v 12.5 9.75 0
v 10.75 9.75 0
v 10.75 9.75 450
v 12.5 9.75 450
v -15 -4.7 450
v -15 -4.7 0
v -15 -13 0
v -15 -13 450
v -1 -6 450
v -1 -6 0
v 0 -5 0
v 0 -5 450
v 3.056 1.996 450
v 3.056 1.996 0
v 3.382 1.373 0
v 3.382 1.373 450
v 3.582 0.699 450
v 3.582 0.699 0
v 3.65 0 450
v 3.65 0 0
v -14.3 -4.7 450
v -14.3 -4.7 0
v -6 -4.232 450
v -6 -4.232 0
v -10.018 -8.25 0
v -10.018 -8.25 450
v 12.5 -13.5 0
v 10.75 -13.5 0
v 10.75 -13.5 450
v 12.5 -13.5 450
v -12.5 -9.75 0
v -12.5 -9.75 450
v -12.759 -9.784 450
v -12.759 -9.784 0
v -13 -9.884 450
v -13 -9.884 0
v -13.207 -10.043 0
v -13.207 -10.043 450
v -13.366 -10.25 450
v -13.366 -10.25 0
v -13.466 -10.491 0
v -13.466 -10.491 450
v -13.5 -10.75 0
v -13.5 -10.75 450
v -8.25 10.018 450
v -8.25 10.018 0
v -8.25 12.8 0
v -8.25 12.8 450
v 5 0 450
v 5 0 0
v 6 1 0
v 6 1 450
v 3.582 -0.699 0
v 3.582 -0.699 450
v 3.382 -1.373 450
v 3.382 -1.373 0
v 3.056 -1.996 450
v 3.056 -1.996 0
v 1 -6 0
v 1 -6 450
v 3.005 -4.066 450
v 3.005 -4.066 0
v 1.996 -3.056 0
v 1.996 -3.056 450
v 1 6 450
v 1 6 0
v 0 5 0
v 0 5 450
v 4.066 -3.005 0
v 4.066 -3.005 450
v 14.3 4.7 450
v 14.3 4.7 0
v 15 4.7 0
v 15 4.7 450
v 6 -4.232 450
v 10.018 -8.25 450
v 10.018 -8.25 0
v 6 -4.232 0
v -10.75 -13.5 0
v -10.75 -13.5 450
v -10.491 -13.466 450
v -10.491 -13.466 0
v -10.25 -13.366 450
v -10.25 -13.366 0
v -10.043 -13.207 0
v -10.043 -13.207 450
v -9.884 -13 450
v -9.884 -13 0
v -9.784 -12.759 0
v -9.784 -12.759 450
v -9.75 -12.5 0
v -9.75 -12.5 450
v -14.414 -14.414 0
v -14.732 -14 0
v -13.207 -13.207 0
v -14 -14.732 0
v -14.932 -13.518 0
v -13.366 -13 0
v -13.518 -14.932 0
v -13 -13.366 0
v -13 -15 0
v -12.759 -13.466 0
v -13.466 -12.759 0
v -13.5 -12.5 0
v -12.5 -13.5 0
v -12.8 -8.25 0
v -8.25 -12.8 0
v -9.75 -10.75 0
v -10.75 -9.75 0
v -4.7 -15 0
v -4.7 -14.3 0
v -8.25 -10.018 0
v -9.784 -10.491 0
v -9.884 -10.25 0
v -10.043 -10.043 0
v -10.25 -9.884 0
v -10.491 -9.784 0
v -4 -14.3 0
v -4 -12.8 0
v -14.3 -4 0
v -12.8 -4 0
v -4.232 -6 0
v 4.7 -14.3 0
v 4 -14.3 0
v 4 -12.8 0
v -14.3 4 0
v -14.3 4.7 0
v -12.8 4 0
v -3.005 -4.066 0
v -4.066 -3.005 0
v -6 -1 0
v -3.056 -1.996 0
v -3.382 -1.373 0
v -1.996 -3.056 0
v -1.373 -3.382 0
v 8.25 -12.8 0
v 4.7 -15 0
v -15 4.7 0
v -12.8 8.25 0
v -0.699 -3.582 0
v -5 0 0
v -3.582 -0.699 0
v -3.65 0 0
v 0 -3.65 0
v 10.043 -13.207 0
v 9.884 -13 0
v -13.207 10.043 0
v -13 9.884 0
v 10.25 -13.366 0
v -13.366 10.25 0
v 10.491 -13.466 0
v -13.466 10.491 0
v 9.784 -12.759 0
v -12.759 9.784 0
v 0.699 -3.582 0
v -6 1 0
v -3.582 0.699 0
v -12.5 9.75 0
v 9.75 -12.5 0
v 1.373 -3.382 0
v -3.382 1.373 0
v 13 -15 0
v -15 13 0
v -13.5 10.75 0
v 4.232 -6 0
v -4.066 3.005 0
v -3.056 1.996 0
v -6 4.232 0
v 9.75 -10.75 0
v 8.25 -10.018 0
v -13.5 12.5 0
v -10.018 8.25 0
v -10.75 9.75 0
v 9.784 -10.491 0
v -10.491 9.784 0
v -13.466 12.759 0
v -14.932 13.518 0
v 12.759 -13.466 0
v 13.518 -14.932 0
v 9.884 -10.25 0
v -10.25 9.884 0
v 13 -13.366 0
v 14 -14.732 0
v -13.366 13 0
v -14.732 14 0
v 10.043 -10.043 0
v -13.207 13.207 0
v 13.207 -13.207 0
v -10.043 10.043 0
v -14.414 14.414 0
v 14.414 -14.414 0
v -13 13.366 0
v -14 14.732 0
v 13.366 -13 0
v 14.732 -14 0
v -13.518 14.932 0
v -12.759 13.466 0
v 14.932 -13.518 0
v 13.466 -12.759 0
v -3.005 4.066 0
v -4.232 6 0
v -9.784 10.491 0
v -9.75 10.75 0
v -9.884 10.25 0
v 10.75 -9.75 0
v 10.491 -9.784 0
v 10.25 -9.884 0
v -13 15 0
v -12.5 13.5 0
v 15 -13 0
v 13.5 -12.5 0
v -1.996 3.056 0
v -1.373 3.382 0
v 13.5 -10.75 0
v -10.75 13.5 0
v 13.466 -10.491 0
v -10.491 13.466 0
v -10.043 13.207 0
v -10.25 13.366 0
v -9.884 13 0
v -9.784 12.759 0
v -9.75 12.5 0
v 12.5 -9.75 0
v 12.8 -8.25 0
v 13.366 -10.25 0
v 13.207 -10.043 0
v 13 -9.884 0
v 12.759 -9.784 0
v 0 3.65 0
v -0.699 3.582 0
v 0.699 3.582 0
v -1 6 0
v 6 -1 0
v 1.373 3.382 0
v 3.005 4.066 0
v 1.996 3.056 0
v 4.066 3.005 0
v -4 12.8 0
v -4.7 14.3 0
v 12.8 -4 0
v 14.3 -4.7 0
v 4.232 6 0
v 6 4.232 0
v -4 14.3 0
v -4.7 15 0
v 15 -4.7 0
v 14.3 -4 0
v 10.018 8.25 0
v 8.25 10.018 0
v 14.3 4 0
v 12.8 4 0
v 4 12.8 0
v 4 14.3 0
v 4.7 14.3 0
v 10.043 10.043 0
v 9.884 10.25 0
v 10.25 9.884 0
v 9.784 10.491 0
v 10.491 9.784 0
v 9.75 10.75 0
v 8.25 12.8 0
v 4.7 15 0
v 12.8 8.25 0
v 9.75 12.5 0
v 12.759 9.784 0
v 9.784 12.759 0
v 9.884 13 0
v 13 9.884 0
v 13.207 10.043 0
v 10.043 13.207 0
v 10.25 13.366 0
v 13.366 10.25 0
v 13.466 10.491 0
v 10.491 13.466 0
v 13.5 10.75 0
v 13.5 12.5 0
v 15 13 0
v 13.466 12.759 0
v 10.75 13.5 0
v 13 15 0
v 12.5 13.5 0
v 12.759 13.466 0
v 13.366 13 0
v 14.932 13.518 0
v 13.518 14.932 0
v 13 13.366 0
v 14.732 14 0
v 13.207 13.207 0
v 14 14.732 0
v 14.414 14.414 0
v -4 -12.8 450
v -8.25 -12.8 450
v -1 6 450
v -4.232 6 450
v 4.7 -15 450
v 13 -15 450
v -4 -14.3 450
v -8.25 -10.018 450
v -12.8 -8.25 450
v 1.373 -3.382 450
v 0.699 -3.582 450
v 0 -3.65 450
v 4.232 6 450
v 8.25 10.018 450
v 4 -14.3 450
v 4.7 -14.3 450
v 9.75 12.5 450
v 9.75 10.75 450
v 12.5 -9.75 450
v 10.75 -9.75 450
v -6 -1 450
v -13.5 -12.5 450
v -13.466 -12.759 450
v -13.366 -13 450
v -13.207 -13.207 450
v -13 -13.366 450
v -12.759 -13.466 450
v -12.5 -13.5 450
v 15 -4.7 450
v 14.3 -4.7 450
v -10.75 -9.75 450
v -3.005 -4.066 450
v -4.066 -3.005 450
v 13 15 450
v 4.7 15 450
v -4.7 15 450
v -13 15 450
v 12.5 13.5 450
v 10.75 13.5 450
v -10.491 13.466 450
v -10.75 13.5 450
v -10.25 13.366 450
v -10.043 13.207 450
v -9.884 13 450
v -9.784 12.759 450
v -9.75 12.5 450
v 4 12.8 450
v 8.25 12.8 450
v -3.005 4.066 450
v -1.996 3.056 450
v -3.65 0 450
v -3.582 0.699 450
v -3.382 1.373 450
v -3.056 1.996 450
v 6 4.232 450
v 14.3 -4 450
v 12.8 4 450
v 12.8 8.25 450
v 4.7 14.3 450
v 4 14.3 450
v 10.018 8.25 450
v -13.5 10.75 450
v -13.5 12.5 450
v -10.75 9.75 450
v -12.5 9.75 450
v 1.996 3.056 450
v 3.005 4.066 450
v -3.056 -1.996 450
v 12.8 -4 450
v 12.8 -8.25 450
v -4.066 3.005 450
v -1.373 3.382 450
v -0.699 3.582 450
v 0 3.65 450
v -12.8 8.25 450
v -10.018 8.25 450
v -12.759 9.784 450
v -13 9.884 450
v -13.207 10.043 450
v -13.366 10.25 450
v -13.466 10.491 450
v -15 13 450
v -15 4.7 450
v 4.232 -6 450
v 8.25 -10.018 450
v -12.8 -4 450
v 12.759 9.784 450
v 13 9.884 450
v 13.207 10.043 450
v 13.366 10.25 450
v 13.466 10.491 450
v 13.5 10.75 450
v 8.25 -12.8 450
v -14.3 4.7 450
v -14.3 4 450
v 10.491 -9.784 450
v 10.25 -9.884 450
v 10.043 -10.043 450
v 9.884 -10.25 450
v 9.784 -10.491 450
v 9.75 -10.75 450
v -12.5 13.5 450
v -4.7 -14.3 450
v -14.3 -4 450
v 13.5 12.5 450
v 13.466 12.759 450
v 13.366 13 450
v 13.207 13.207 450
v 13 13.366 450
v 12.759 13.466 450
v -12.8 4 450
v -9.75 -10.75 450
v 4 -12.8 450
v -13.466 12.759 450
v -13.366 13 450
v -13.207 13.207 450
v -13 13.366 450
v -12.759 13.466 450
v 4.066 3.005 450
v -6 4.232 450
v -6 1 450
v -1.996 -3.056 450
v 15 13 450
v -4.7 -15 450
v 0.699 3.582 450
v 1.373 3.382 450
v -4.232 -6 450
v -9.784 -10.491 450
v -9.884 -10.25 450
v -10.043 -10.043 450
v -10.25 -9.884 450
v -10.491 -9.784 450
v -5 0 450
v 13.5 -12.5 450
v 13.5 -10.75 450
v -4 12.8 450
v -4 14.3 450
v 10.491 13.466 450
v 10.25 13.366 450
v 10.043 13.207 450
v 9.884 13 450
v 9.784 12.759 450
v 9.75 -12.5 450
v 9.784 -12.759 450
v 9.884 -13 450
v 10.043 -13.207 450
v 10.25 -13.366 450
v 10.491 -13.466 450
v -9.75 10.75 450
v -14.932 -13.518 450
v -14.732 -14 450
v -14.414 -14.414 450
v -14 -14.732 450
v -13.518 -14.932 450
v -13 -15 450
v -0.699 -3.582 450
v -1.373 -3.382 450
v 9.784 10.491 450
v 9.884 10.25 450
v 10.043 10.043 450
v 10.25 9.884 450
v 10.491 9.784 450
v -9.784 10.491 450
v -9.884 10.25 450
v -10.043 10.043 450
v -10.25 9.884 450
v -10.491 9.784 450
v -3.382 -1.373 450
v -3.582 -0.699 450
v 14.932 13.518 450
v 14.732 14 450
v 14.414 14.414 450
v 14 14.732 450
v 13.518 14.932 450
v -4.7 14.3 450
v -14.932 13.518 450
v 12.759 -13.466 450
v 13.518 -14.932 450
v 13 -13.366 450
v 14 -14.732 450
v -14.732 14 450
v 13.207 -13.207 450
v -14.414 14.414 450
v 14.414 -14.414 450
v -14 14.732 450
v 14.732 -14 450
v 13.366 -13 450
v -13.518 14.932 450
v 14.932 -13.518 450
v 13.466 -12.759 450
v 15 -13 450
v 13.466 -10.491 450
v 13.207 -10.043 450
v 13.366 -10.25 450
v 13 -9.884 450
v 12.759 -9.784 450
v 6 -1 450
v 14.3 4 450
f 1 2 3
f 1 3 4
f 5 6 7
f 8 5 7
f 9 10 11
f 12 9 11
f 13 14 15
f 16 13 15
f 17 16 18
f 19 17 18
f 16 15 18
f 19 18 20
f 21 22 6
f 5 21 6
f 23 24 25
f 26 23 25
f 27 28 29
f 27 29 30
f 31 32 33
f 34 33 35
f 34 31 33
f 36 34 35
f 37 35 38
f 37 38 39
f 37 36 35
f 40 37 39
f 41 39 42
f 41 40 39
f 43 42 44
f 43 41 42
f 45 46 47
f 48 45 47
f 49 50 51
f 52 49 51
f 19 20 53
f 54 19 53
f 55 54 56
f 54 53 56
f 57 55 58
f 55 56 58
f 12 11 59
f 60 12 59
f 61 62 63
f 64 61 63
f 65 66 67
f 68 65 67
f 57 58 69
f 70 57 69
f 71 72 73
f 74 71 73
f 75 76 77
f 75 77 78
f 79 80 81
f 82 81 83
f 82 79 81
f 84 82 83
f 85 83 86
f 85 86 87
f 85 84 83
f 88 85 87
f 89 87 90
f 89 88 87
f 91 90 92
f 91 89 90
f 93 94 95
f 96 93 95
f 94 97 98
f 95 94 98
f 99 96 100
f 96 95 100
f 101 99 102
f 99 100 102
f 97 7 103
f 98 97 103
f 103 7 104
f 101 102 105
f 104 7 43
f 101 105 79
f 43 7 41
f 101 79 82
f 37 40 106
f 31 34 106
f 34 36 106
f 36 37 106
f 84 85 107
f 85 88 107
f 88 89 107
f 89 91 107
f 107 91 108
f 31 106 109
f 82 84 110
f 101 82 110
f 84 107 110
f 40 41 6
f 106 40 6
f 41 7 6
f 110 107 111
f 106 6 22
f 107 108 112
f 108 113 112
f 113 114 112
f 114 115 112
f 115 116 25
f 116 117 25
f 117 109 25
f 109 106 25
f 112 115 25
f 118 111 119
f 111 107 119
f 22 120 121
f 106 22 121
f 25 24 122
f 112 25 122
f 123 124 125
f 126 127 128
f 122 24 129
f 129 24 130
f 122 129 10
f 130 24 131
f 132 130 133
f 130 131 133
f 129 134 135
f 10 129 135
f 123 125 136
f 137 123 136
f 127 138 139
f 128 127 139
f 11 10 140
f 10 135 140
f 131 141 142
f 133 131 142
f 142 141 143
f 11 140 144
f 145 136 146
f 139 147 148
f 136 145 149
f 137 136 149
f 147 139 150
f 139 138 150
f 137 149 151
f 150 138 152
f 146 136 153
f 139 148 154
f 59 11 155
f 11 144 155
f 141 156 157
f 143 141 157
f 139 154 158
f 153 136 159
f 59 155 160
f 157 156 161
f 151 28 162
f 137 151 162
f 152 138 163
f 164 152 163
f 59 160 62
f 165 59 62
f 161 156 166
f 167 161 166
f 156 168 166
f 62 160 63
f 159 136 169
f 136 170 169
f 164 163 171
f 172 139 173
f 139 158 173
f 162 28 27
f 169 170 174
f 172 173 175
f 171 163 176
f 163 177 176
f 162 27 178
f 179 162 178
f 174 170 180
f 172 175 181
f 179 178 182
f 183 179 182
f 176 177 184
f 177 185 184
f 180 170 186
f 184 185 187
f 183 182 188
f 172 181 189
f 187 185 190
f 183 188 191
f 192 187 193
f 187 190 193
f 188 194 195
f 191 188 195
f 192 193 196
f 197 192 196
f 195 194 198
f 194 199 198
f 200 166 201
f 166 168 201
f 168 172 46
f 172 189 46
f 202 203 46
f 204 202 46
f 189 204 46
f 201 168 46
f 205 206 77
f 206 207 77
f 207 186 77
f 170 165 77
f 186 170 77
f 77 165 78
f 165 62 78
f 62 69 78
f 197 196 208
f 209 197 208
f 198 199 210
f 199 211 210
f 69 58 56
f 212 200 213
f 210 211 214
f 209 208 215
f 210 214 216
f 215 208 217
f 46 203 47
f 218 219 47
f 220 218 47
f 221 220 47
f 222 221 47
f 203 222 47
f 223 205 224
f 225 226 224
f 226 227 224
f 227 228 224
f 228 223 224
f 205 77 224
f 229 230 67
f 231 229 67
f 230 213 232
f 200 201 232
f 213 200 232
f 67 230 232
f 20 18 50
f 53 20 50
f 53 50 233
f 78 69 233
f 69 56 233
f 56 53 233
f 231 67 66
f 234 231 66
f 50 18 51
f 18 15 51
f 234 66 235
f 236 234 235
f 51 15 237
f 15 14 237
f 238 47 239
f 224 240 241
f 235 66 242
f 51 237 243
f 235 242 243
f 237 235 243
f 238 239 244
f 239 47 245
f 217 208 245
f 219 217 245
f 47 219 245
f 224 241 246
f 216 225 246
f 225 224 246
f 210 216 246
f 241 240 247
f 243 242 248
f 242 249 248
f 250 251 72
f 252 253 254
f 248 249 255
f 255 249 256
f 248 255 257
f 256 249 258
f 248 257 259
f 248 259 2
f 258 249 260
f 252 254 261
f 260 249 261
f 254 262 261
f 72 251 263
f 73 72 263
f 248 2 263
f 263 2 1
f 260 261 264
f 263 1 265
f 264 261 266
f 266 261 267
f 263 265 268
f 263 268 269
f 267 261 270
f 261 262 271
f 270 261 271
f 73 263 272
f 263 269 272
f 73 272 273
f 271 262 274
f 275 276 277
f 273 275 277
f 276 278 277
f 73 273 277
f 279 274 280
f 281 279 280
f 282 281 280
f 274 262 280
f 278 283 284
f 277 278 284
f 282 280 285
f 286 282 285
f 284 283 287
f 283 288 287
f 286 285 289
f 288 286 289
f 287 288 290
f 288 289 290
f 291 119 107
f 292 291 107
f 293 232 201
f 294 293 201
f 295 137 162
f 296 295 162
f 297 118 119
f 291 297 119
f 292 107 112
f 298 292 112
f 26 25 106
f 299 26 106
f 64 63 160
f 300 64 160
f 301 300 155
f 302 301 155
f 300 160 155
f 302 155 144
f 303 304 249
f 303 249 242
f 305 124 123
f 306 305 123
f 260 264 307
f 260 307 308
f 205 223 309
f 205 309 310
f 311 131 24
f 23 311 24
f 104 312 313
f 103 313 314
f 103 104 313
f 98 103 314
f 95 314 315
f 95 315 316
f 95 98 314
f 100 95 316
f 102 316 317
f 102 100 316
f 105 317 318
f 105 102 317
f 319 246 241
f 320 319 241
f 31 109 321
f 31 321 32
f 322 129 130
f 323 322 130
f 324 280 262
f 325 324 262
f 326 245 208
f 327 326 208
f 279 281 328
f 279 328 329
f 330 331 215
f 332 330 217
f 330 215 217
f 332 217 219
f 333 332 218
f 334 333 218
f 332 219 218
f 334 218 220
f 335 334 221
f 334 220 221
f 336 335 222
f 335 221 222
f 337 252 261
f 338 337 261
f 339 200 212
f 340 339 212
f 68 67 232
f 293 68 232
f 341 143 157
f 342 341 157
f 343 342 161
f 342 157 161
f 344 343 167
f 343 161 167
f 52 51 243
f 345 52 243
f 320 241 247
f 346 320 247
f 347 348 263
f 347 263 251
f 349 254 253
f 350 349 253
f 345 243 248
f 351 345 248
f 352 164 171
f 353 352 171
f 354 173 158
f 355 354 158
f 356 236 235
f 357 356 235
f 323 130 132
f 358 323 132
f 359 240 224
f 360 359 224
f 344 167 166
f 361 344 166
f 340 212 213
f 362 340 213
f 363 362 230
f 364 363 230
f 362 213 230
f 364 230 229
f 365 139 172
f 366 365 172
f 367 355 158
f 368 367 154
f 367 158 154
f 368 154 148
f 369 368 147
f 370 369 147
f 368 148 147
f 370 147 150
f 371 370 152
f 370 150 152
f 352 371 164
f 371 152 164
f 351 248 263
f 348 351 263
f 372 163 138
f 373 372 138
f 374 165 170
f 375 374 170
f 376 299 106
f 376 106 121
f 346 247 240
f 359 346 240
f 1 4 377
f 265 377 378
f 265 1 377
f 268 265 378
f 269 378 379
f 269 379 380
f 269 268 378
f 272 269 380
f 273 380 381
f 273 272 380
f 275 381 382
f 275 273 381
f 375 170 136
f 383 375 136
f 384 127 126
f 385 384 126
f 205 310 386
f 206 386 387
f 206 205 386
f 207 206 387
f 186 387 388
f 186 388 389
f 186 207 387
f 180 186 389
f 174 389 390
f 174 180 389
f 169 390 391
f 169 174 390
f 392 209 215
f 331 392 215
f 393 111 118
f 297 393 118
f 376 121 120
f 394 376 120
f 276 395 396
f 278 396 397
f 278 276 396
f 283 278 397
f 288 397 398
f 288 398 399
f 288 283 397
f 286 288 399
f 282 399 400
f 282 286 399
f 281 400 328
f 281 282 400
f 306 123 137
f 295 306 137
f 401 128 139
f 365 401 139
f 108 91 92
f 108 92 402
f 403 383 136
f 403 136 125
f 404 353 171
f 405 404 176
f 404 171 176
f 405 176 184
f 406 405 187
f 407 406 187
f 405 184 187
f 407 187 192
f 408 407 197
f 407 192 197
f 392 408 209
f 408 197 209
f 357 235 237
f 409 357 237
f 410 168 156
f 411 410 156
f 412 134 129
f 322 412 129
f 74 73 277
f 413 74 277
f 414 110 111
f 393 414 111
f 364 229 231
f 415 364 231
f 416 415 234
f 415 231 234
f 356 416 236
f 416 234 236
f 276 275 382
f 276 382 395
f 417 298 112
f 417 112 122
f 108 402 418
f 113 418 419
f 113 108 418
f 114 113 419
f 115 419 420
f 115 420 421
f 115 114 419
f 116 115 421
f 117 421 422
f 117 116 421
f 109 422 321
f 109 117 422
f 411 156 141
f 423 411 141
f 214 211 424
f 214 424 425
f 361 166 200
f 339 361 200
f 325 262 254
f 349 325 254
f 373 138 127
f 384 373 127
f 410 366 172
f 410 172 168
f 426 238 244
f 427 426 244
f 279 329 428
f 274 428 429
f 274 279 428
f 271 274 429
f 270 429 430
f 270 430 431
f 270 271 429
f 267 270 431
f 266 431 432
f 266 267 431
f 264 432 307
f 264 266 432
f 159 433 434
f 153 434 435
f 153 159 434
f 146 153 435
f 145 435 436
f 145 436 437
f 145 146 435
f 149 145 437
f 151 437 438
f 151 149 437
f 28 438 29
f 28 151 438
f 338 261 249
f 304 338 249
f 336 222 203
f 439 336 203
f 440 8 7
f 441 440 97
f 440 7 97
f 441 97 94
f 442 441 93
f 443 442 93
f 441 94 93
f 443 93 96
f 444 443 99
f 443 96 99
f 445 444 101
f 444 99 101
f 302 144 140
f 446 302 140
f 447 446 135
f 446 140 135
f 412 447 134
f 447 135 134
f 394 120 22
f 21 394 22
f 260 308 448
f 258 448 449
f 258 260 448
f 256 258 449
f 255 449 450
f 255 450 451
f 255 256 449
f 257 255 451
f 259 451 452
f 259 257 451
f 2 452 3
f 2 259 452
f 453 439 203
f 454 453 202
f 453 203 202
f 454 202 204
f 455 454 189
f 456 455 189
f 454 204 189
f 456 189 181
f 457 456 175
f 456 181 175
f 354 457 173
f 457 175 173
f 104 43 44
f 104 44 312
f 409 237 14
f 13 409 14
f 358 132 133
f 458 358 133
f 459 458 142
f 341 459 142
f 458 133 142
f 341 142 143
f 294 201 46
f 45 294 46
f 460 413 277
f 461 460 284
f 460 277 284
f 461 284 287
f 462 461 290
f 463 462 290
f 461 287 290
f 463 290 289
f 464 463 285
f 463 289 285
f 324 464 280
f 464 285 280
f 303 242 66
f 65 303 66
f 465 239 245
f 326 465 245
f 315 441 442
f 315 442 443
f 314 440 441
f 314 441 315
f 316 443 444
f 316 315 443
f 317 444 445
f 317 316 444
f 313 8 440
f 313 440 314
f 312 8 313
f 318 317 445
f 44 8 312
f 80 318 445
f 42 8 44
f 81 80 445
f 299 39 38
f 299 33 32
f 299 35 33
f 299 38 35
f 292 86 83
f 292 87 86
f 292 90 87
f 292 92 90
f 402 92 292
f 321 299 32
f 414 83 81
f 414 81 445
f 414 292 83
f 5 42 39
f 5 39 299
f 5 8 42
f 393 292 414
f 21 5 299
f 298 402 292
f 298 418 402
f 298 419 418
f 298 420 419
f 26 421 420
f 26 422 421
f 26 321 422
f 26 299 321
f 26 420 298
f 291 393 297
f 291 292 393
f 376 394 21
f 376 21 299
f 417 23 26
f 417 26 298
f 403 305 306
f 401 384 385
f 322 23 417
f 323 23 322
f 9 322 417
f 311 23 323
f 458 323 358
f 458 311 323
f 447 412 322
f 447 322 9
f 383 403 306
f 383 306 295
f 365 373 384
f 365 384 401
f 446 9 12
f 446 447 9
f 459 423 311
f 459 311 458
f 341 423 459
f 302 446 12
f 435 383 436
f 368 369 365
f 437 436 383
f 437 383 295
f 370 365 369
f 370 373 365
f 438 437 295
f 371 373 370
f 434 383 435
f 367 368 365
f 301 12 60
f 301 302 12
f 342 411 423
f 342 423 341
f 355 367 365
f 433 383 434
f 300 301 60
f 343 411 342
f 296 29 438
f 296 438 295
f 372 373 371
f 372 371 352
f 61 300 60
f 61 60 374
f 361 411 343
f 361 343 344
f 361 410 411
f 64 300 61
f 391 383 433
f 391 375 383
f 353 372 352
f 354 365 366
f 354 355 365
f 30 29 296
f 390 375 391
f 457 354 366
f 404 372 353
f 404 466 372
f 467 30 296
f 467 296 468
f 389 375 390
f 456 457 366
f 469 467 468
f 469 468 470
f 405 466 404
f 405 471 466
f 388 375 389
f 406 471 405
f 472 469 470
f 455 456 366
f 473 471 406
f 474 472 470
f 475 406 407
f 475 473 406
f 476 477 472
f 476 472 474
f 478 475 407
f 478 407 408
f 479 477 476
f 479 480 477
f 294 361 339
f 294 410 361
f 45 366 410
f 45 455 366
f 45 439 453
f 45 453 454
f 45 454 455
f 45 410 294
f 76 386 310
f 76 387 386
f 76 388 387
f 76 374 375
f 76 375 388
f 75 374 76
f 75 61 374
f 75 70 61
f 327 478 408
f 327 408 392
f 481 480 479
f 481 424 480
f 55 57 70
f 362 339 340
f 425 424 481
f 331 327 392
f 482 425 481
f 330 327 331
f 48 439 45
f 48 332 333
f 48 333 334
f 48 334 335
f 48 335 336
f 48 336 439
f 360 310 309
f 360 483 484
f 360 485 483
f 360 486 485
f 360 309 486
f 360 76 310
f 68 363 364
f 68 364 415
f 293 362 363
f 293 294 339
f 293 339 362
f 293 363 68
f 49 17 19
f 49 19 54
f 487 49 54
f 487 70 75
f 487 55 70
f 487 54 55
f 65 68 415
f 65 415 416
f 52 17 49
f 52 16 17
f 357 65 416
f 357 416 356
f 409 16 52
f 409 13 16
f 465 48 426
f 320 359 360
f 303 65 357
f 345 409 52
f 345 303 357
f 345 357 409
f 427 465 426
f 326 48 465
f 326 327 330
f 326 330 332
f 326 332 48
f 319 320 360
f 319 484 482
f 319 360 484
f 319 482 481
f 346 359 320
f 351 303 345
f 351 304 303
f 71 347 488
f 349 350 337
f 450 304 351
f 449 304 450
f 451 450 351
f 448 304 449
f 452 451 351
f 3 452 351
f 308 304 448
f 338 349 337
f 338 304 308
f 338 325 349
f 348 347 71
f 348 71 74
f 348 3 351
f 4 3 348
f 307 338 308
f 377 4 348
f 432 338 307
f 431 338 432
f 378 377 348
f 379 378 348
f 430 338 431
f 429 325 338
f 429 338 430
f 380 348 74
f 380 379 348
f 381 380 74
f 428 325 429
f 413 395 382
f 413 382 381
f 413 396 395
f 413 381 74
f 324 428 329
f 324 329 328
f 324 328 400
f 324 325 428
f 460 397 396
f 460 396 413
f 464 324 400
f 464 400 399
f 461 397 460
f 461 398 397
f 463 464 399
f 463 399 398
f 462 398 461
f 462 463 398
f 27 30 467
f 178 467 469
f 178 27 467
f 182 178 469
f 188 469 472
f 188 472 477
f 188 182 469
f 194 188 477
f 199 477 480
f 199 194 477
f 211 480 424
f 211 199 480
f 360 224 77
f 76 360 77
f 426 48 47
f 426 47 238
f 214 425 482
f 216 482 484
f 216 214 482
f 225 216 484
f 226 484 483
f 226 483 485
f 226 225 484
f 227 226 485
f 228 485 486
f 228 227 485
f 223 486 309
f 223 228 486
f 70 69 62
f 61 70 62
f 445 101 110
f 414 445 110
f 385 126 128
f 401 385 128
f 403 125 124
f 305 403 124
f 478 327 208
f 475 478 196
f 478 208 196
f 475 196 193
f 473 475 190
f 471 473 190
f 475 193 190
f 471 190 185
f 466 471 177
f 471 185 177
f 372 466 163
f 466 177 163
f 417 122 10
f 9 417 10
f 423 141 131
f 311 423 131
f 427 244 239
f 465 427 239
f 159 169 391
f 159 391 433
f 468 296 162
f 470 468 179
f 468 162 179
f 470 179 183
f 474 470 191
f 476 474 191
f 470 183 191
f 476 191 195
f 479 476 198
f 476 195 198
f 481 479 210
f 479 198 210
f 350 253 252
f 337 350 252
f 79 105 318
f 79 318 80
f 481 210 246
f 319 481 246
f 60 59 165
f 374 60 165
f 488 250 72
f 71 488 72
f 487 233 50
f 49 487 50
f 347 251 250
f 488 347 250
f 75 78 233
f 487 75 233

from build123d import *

# Parameters (mm, degrees)
ESTRUSIONE_ESTRUSIONE2_DEPTH = 450


with BuildPart() as part:
    # Schizzo1 → Estrusione-Estrusione2 (new body)
    with BuildSketch(Plane.XY):
        with BuildLine():
            Line((-15, 13), (-15, 4.7))
            Line((-15, 4.7), (-14.3, 4.7))
            Line((-14.3, 4.7), (-14.3, 4))
            Line((-14.3, 4), (-12.8, 4))
            Line((-12.8, 4), (-12.8, 8.25))
            Line((-12.8, 8.25), (-10.017766953, 8.25))
            Line((-10.017766953, 8.25), (-6, 4.232233047))
            Line((-6, 4.232233047), (-6, 1))
            Line((-6, 1), (-5, 0))
            Line((-5, 0), (-6, -1))
            Line((-6, -1), (-6, -4.232233047))
            Line((-6, -4.232233047), (-10.017766953, -8.25))
            Line((-10.017766953, -8.25), (-12.8, -8.25))
            Line((-12.8, -8.25), (-12.8, -4))
            Line((-12.8, -4), (-14.3, -4))
            Line((-14.3, -4), (-14.3, -4.7))
            Line((-14.3, -4.7), (-15, -4.7))
            Line((-15, -4.7), (-15, -13))
            ThreePointArc((-15, -13), (-14.414213562, -14.414213562), (-13, -15))
            Line((-13, -15), (-4.7, -15))
            Line((-4.7, -15), (-4.7, -14.3))
            Line((-4.7, -14.3), (-4, -14.3))
            Line((-4, -14.3), (-4, -12.8))
            Line((-4, -12.8), (-8.25, -12.8))
            Line((-8.25, -12.8), (-8.25, -10.017766953))
            Line((-8.25, -10.017766953), (-4.232233047, -6))
            Line((-4.232233047, -6), (-1, -6))
            Line((-1, -6), (0, -5))
            Line((0, -5), (1, -6))
            Line((1, -6), (4.232233047, -6))
            Line((4.232233047, -6), (8.25, -10.017766953))
            Line((8.25, -10.017766953), (8.25, -12.8))
            Line((8.25, -12.8), (4, -12.8))
            Line((4, -12.8), (4, -14.3))
            Line((4, -14.3), (4.7, -14.3))
            Line((4.7, -14.3), (4.7, -15))
            Line((4.7, -15), (13, -15))
            ThreePointArc((13, -15), (14.414213562, -14.414213562), (15, -13))
            Line((15, -13), (15, -4.7))
            Line((15, -4.7), (14.3, -4.7))
            Line((14.3, -4.7), (14.3, -4))
            Line((14.3, -4), (12.8, -4))
            Line((12.8, -4), (12.8, -8.25))
            Line((12.8, -8.25), (10.017766953, -8.25))
            Line((10.017766953, -8.25), (6, -4.232233047))
            Line((6, -4.232233047), (6, -1))
            Line((6, -1), (5, 0))
            Line((5, 0), (6, 1))
            Line((6, 1), (6, 4.232233047))
            Line((6, 4.232233047), (10.017766953, 8.25))
            Line((10.017766953, 8.25), (12.8, 8.25))
            Line((12.8, 8.25), (12.8, 4))
            Line((12.8, 4), (14.3, 4))
            Line((14.3, 4), (14.3, 4.7))
            Line((14.3, 4.7), (15, 4.7))
            Line((15, 4.7), (15, 13))
            ThreePointArc((15, 13), (14.414213562, 14.414213562), (13, 15))
            Line((13, 15), (4.7, 15))
            Line((4.7, 15), (4.7, 14.3))
            Line((4.7, 14.3), (4, 14.3))
            Line((4, 14.3), (4, 12.8))
            Line((4, 12.8), (8.25, 12.8))
            Line((8.25, 12.8), (8.25, 10.017766953))
            Line((8.25, 10.017766953), (4.232233047, 6))
            Line((4.232233047, 6), (1, 6))
            Line((1, 6), (0, 5))
            Line((0, 5), (-1, 6))
            Line((-1, 6), (-4.232233047, 6))
            Line((-4.232233047, 6), (-8.25, 10.017766953))
            Line((-8.25, 10.017766953), (-8.25, 12.8))
            Line((-8.25, 12.8), (-4, 12.8))
            Line((-4, 12.8), (-4, 14.3))
            Line((-4, 14.3), (-4.7, 14.3))
            Line((-4.7, 14.3), (-4.7, 15))
            Line((-4.7, 15), (-13, 15))
            ThreePointArc((-13, 15), (-14.414213562, 14.414213562), (-15, 13))
        make_face()
        with BuildLine():
            Line((13.5, 10.75), (13.5, 12.5))
            ThreePointArc((13.5, 12.5), (13.207106781, 13.207106781), (12.5, 13.5))
            Line((12.5, 13.5), (10.75, 13.5))
            ThreePointArc((10.75, 13.5), (10.042893219, 13.207106781), (9.75, 12.5))
            Line((9.75, 12.5), (9.75, 10.75))
            ThreePointArc((9.75, 10.75), (10.042893219, 10.042893219), (10.75, 9.75))
            Line((10.75, 9.75), (12.5, 9.75))
            ThreePointArc((12.5, 9.75), (13.207106781, 10.042893219), (13.5, 10.75))
        make_face(mode=Mode.SUBTRACT)
        with BuildLine():
            Line((10.75, -13.5), (12.5, -13.5))
            ThreePointArc((12.5, -13.5), (13.207106781, -13.207106781), (13.5, -12.5))
            Line((13.5, -12.5), (13.5, -10.75))
            ThreePointArc((13.5, -10.75), (13.207106781, -10.042893219), (12.5, -9.75))
            Line((12.5, -9.75), (10.75, -9.75))
            ThreePointArc((10.75, -9.75), (10.042893219, -10.042893219), (9.75, -10.75))
            Line((9.75, -10.75), (9.75, -12.5))
            ThreePointArc((9.75, -12.5), (10.042893219, -13.207106781), (10.75, -13.5))
        make_face(mode=Mode.SUBTRACT)
        with BuildLine():
            Line((-13.5, -10.75), (-13.5, -12.5))
            ThreePointArc((-13.5, -12.5), (-13.207106781, -13.207106781), (-12.5, -13.5))
            Line((-12.5, -13.5), (-10.75, -13.5))
            ThreePointArc((-10.75, -13.5), (-10.042893219, -13.207106781), (-9.75, -12.5))
            Line((-9.75, -12.5), (-9.75, -10.75))
            ThreePointArc((-9.75, -10.75), (-10.042893219, -10.042893219), (-10.75, -9.75))
            Line((-10.75, -9.75), (-12.5, -9.75))
            ThreePointArc((-12.5, -9.75), (-13.207106781, -10.042893219), (-13.5, -10.75))
        make_face(mode=Mode.SUBTRACT)
        with BuildLine():
            Line((1.995536102, 3.056196274), (3.00520382, 4.065863992))
            Line((3.00520382, 4.065863992), (4.065863992, 3.00520382))
            Line((4.065863992, 3.00520382), (3.056196274, 1.995536102))
            ThreePointArc((3.056196274, 1.995536102), (3.498400806, 1.041005187), (3.65, 0))
            ThreePointArc((3.65, 0), (3.498400806, -1.041005187), (3.056196274, -1.995536102))
            Line((3.056196274, -1.995536102), (4.065863992, -3.00520382))
            Line((4.065863992, -3.00520382), (3.00520382, -4.065863992))
            Line((3.00520382, -4.065863992), (1.995536102, -3.056196274))
            ThreePointArc((1.995536102, -3.056196274), (1.041005187, -3.498400806), (0, -3.65))
            ThreePointArc((0, -3.65), (-1.041005187, -3.498400806), (-1.995536102, -3.056196274))
            Line((-1.995536102, -3.056196274), (-3.00520382, -4.065863992))
            Line((-3.00520382, -4.065863992), (-4.065863992, -3.00520382))
            Line((-4.065863992, -3.00520382), (-3.056196274, -1.995536102))
            ThreePointArc((-3.056196274, -1.995536102), (-3.498400806, -1.041005187), (-3.65, 0))
            ThreePointArc((-3.65, 0), (-3.498400806, 1.041005187), (-3.056196274, 1.995536102))
            Line((-3.056196274, 1.995536102), (-4.065863992, 3.00520382))
            Line((-4.065863992, 3.00520382), (-3.00520382, 4.065863992))
            Line((-3.00520382, 4.065863992), (-1.995536102, 3.056196274))
            ThreePointArc((-1.995536102, 3.056196274), (-1.041005187, 3.498400806), (0, 3.65))
            ThreePointArc((0, 3.65), (1.041005187, 3.498400806), (1.995536102, 3.056196274))
        make_face(mode=Mode.SUBTRACT)
        with BuildLine():
            Line((-10.75, 9.75), (-12.5, 9.75))
            ThreePointArc((-12.5, 9.75), (-13.207106781, 10.042893219), (-13.5, 10.75))
            Line((-13.5, 10.75), (-13.5, 12.5))
            ThreePointArc((-13.5, 12.5), (-13.207106781, 13.207106781), (-12.5, 13.5))
            Line((-12.5, 13.5), (-10.75, 13.5))
            ThreePointArc((-10.75, 13.5), (-10.042893219, 13.207106781), (-9.75, 12.5))
            Line((-9.75, 12.5), (-9.75, 10.75))
            ThreePointArc((-9.75, 10.75), (-10.042893219, 10.042893219), (-10.75, 9.75))
        make_face(mode=Mode.SUBTRACT)
    extrude(amount=ESTRUSIONE_ESTRUSIONE2_DEPTH)


solid = part.part
